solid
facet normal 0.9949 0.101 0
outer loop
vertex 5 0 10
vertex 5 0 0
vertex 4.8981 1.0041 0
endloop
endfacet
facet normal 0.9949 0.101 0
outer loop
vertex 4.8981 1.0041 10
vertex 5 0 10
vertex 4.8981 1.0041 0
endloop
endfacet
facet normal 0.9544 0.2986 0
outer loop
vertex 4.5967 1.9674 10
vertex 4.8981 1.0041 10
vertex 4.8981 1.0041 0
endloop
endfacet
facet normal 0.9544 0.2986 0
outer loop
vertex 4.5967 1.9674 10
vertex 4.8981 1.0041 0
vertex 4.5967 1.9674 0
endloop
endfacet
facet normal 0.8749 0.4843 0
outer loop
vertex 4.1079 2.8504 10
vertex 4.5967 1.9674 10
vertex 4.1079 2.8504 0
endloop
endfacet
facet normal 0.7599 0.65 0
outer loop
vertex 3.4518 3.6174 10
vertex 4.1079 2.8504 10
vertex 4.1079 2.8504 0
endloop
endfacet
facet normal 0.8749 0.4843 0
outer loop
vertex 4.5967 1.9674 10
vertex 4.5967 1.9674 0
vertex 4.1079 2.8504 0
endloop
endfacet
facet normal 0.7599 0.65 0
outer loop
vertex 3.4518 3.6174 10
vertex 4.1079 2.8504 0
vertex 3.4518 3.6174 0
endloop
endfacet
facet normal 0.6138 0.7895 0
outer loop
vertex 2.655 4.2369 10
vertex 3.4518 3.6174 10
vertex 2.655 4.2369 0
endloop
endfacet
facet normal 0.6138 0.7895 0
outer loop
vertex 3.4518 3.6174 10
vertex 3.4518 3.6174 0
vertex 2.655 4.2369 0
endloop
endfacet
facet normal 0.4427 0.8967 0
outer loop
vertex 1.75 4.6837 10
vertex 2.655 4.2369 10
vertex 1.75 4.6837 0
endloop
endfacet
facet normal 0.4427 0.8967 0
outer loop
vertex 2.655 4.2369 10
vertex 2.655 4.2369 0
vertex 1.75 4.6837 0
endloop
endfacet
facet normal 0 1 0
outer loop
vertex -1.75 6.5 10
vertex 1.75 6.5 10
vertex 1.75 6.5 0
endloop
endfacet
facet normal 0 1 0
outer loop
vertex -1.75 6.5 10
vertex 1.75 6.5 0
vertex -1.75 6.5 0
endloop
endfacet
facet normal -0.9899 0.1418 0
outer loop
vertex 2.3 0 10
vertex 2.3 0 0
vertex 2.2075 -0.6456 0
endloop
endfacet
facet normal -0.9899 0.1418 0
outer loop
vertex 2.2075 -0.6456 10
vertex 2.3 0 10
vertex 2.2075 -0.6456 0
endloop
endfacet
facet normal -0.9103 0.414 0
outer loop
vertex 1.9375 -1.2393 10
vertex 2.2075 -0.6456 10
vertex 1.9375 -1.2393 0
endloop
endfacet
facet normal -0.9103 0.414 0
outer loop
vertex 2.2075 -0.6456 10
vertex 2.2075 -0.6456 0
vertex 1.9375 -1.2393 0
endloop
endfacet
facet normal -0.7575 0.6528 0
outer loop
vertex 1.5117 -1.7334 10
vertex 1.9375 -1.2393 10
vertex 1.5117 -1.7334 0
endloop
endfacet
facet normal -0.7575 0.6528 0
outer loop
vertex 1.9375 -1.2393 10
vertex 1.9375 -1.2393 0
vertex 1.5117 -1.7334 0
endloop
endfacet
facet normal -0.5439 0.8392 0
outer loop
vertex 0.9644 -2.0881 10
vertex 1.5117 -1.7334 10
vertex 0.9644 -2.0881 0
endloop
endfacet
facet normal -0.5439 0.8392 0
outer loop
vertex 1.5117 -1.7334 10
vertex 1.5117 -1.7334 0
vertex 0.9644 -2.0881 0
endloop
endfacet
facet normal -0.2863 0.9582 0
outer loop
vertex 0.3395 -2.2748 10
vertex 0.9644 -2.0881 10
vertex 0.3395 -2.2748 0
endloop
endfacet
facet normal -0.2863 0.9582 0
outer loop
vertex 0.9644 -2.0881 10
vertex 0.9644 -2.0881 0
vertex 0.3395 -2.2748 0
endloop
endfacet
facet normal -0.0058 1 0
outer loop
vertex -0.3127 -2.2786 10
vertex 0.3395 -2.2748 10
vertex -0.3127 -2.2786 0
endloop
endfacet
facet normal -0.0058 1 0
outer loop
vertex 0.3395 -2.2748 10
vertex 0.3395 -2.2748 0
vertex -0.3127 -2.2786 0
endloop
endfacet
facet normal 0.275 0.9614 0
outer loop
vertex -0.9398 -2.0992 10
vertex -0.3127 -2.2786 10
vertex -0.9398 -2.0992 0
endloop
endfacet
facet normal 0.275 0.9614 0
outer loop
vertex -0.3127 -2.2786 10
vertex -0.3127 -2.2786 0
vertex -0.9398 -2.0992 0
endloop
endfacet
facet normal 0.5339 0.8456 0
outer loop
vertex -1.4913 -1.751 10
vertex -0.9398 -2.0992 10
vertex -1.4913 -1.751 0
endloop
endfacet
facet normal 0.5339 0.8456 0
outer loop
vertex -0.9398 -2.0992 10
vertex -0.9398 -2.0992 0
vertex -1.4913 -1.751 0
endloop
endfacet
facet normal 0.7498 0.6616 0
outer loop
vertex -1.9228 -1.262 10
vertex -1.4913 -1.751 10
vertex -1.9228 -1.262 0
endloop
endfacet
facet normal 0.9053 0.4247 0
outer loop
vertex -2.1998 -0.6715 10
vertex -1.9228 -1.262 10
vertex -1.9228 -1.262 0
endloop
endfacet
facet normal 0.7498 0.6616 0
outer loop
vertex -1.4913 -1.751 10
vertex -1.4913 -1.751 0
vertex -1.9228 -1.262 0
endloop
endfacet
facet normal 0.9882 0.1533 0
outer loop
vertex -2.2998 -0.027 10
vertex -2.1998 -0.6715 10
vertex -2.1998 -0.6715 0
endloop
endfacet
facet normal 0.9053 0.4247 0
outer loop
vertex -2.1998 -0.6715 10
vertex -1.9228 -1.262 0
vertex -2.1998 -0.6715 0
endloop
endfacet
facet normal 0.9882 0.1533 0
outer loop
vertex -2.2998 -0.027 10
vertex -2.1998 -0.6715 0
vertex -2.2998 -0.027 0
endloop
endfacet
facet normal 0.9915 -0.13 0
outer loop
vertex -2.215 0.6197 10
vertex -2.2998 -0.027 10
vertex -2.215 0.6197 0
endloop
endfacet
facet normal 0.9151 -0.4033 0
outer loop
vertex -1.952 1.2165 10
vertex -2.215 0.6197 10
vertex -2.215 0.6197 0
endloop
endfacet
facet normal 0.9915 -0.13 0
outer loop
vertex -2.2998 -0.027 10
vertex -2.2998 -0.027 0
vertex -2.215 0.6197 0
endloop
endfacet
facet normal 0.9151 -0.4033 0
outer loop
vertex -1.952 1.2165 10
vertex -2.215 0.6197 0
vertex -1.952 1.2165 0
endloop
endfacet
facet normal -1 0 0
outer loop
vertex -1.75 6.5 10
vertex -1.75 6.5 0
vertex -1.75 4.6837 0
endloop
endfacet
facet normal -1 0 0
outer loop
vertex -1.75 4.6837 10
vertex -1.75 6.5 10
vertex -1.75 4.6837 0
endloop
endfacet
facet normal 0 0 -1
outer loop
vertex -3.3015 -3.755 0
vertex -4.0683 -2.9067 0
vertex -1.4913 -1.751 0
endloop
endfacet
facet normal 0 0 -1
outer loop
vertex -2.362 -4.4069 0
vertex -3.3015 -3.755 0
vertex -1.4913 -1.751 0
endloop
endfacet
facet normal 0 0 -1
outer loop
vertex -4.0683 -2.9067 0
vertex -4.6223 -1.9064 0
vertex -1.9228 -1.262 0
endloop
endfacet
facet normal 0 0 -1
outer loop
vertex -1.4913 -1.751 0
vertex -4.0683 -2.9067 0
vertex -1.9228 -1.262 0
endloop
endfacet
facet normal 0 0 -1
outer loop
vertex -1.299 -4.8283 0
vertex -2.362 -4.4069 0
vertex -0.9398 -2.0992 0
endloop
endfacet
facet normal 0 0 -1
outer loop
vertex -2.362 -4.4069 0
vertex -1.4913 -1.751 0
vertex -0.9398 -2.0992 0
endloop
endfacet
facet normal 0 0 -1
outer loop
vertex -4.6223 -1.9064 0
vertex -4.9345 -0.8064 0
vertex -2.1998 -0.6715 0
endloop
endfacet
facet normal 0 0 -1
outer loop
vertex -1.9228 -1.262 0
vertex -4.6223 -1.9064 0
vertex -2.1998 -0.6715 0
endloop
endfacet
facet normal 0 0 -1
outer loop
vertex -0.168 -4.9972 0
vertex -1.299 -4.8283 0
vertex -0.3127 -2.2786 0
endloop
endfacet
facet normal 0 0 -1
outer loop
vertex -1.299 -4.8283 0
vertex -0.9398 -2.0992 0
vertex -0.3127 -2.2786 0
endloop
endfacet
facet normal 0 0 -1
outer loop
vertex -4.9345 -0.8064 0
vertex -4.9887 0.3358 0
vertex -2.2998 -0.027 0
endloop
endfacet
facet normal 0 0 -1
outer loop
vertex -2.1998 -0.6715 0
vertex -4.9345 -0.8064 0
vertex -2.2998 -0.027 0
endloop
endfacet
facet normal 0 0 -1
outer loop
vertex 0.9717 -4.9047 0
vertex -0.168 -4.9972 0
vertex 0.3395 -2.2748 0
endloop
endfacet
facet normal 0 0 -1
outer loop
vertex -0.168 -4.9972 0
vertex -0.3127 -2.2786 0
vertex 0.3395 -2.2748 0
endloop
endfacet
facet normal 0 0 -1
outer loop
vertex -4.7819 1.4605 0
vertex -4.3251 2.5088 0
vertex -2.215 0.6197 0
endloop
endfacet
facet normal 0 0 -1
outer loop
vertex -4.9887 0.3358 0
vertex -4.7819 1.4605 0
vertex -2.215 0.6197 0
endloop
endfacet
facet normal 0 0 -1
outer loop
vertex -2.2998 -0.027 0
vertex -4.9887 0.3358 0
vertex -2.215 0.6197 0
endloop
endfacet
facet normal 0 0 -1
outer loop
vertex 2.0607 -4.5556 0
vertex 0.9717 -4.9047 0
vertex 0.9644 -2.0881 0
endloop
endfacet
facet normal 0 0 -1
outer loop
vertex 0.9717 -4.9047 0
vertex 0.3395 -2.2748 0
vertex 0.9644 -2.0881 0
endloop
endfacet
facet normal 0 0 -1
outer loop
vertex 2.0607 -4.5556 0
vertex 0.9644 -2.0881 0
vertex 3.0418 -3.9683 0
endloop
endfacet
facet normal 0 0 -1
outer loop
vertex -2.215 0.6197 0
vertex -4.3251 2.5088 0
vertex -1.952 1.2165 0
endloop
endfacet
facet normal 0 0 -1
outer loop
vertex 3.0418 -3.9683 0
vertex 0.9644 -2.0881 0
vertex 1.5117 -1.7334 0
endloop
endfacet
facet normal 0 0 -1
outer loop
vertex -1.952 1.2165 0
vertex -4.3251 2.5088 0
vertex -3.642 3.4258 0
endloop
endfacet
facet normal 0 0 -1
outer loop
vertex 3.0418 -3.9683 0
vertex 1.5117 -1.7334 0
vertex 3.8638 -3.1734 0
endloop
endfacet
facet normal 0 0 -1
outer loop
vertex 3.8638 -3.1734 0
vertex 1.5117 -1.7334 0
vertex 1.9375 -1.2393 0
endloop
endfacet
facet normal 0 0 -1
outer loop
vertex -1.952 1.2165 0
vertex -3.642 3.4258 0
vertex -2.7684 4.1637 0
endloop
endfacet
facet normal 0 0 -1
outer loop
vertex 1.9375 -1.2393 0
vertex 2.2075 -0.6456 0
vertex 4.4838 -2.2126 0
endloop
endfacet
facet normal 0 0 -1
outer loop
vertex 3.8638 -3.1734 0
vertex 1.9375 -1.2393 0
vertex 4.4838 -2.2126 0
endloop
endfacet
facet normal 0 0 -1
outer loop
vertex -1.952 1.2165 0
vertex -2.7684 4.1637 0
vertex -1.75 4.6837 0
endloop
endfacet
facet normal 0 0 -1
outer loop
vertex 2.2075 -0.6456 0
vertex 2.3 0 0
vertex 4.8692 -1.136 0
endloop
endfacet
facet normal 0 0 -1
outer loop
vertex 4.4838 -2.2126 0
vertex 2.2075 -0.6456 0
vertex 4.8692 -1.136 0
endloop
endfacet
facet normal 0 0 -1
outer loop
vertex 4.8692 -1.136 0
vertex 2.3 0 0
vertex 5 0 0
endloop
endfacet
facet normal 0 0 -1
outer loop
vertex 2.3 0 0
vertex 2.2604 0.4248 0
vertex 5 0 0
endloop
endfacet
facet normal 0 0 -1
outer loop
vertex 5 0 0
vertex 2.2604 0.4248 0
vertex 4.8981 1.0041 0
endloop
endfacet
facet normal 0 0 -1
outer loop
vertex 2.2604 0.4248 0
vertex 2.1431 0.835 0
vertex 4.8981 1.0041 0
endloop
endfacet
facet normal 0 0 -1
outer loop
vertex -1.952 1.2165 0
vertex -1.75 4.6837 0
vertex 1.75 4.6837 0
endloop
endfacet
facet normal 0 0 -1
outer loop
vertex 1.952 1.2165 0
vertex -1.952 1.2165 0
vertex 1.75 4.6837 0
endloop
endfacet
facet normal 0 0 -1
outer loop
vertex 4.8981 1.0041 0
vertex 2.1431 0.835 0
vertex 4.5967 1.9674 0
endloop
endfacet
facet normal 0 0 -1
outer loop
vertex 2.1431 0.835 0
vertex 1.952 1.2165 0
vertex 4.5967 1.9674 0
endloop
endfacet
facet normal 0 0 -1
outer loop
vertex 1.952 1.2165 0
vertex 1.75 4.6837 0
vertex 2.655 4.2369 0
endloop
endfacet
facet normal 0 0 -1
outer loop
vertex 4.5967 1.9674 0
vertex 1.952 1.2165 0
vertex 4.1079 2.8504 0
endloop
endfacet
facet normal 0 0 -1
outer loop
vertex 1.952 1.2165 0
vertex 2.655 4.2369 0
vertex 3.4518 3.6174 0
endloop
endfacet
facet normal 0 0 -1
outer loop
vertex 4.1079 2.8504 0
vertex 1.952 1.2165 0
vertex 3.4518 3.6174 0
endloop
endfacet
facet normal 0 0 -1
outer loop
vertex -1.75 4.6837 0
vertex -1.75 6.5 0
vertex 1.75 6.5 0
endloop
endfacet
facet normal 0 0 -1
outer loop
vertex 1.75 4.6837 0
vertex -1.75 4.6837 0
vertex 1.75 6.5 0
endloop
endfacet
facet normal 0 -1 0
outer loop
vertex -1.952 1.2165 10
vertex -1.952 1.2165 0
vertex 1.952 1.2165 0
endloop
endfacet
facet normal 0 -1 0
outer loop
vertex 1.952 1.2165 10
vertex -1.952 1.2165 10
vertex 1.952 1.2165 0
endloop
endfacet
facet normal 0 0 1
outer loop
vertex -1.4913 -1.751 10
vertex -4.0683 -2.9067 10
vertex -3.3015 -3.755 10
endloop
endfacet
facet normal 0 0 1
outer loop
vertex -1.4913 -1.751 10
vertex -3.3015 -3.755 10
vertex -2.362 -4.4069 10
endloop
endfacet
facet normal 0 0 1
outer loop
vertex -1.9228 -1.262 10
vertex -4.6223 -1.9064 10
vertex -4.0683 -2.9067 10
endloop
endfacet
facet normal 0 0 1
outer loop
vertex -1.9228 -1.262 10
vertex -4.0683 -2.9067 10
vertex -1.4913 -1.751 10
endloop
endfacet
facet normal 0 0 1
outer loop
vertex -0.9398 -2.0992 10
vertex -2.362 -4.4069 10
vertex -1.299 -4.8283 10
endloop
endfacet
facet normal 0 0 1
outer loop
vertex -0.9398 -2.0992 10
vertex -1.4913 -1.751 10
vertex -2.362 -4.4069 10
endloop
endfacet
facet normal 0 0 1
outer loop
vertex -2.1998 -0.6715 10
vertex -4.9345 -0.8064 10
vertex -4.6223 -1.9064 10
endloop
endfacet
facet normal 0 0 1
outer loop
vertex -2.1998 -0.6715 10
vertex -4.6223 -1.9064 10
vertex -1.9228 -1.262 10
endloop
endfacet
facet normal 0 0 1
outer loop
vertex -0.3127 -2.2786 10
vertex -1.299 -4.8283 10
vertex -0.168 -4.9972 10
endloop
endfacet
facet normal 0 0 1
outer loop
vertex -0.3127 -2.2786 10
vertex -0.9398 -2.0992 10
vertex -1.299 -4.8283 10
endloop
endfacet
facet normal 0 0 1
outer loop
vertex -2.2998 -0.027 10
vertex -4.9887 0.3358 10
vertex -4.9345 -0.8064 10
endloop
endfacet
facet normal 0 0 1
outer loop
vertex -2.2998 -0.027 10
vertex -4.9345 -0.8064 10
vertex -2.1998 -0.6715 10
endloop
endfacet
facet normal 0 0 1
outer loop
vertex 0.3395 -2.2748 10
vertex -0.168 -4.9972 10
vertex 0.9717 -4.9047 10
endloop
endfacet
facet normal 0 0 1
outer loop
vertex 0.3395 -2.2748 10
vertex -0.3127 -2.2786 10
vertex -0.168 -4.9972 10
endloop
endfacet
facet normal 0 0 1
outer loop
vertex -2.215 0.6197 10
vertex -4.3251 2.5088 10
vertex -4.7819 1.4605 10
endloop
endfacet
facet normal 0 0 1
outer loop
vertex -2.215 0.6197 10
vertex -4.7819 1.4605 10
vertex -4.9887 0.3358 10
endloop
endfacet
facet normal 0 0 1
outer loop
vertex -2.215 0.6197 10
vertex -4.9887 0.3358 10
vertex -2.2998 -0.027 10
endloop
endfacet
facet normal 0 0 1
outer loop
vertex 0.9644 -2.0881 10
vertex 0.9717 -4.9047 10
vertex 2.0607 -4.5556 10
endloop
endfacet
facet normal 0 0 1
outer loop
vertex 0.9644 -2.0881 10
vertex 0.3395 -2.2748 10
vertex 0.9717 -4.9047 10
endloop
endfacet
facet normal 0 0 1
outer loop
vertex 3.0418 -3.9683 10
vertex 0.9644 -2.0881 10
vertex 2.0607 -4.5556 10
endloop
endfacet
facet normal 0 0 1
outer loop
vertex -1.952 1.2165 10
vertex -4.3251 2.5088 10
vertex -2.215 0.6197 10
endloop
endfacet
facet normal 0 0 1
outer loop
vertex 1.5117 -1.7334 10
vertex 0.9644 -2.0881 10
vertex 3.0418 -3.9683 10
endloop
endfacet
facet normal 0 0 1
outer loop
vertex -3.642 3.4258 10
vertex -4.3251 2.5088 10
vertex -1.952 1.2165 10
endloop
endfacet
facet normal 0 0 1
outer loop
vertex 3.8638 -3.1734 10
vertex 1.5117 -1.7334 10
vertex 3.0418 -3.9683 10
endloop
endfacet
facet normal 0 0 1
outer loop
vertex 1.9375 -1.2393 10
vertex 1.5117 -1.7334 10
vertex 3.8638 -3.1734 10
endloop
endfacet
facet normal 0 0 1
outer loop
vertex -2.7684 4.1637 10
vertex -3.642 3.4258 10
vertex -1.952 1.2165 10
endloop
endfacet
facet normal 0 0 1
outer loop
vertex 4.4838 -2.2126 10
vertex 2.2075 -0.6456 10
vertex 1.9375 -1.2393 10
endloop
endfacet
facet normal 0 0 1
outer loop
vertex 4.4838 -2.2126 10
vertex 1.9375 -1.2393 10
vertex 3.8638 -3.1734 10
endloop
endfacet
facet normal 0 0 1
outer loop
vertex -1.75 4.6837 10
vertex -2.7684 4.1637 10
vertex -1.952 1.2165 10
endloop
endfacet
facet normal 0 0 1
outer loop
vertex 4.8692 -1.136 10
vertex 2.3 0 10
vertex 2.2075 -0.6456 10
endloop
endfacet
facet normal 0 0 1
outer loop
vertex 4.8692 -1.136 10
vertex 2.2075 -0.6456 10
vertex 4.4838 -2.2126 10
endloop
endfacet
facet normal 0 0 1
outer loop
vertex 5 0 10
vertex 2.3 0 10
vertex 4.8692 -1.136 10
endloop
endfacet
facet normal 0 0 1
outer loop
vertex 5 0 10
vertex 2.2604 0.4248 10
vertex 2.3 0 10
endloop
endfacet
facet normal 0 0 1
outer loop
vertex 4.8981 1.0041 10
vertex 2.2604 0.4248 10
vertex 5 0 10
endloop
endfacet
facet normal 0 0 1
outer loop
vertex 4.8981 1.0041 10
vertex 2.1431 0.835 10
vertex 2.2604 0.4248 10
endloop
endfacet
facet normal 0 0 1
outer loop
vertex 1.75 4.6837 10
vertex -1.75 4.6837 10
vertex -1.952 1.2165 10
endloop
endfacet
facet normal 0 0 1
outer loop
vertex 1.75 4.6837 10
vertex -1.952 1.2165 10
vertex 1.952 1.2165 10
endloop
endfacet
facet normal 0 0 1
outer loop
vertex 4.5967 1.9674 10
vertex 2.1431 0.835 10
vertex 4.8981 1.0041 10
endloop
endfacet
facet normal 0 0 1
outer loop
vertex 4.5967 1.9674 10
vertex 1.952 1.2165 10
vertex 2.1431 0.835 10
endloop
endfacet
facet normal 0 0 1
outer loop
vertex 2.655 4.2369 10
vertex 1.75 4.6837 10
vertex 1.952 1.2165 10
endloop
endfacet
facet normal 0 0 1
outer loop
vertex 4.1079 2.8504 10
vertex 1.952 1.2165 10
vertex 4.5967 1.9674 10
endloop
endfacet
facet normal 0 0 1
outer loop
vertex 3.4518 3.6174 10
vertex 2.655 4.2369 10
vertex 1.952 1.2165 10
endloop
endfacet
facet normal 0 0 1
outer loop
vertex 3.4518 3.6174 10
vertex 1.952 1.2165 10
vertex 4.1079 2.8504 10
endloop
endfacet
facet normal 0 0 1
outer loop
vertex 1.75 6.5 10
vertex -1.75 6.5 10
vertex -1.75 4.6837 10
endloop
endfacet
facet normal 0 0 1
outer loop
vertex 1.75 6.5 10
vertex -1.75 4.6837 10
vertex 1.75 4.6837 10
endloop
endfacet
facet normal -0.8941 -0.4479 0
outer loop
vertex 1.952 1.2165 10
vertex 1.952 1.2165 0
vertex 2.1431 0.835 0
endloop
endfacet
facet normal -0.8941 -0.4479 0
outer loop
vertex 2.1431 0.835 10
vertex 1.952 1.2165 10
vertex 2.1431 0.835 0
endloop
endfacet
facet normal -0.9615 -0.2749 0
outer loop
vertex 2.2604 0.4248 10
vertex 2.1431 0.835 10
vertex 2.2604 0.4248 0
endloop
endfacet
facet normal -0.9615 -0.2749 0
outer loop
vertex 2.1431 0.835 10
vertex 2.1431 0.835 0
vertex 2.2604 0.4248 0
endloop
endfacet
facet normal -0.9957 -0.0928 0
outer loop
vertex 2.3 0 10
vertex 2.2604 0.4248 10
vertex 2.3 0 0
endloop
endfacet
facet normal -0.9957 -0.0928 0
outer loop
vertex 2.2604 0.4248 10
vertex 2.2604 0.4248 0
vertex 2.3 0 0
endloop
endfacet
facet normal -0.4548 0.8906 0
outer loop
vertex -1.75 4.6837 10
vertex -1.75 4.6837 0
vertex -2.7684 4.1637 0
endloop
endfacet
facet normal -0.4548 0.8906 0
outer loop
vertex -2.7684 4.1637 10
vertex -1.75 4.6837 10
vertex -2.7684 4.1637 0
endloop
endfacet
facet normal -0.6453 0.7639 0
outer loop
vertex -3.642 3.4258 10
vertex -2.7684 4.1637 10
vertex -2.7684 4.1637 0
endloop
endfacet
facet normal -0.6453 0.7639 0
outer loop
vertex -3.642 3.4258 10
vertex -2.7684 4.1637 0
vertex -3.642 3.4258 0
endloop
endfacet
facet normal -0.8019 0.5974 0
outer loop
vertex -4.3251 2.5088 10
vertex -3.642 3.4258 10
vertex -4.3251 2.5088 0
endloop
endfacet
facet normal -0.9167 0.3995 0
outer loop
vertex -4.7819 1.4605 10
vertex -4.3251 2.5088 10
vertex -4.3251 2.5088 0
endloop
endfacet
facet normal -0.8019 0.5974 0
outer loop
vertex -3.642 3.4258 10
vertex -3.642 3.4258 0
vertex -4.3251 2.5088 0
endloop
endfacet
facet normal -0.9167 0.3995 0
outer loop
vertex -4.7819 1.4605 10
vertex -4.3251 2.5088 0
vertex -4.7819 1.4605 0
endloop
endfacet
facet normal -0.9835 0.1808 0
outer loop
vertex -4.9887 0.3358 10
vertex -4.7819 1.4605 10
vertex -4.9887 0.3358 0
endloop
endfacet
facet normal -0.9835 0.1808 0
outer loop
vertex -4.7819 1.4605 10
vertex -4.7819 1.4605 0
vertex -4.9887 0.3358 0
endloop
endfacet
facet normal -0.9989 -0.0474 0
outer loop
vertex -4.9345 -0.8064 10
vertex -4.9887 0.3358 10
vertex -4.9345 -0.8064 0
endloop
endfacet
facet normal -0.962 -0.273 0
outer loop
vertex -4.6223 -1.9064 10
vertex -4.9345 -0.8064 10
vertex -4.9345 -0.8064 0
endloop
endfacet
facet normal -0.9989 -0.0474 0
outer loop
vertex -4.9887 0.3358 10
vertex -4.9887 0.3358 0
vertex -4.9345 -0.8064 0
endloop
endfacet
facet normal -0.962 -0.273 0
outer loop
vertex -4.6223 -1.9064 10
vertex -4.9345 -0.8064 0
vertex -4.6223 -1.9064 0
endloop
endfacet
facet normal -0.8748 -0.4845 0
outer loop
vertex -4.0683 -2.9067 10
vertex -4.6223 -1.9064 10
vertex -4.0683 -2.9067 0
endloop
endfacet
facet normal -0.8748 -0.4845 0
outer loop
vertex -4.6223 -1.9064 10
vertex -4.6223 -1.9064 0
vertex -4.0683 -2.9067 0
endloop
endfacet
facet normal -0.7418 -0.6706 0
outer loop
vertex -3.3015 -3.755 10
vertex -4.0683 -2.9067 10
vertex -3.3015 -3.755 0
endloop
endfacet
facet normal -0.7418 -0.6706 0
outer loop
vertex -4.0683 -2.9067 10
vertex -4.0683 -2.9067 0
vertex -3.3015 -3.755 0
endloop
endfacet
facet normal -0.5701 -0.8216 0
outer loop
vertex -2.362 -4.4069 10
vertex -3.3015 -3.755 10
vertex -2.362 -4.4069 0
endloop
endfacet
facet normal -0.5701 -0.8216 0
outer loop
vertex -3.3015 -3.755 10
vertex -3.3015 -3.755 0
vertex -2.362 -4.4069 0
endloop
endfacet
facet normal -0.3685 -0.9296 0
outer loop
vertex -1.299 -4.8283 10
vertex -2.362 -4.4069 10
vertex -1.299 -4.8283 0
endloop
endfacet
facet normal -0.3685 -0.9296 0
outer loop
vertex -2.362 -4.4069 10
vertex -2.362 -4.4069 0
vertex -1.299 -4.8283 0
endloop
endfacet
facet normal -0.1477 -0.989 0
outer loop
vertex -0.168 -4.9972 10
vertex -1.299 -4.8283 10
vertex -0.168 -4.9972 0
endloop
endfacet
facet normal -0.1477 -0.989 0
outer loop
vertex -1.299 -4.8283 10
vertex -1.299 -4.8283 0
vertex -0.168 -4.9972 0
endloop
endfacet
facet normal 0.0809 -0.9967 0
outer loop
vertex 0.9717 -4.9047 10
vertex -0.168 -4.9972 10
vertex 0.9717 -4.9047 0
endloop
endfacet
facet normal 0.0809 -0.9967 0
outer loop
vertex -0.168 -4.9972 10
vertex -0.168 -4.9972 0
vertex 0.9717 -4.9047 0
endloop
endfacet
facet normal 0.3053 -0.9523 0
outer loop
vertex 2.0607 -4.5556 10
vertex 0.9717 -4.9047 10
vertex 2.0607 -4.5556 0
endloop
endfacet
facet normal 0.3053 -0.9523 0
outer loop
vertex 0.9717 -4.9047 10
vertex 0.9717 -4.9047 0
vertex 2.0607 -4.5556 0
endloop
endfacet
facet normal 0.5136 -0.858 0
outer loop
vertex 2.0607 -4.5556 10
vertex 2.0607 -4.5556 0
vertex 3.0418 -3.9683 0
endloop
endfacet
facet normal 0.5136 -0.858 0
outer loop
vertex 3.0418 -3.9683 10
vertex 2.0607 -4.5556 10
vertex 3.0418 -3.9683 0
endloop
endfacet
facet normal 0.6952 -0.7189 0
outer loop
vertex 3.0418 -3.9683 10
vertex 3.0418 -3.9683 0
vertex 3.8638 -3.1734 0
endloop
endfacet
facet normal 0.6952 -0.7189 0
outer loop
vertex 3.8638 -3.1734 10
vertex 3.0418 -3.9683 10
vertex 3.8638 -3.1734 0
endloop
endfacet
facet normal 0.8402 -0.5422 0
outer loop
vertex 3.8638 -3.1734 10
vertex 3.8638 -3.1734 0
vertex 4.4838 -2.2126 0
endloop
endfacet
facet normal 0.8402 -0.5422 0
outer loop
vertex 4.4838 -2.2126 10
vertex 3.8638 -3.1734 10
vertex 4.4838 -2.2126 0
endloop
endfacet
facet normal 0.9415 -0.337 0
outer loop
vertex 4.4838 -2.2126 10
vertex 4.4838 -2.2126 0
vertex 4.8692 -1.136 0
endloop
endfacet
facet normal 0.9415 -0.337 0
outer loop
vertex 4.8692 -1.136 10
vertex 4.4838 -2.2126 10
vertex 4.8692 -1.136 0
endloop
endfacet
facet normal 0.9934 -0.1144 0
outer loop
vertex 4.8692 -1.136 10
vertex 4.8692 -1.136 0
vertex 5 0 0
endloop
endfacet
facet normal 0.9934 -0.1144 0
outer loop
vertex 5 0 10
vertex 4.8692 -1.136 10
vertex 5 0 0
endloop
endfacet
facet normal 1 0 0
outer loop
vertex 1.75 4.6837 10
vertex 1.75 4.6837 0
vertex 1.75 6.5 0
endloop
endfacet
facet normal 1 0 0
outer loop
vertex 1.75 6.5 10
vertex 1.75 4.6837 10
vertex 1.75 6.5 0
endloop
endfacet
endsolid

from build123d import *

# Parameters (mm, degrees)
BOSS_EXTRUDE1_DEPTH = 10


with BuildPart() as part:
    # Sketch2 → Boss-Extrude1 (new body)
    with BuildSketch(Plane.XY):
        with BuildLine():
            ThreePointArc((0, 5), (0.889173073, 4.920301947), (1.75, 4.683748499))
            Line((1.75, 4.683748499), (1.75, 6.5))
            Line((1.75, 6.5), (0, 6.5))
            Line((0, 6.5), (0, 5))
        make_face()
        with BuildLine():
            ThreePointArc((-1.75, 4.683748499), (-0.889173073, 4.920301947), (0, 5))
            Line((0, 5), (0, 6.5))
            Line((0, 6.5), (-1.75, 6.5))
            Line((-1.75, 6.5), (-1.75, 4.683748499))
        make_face()
        with BuildLine():
            ThreePointArc((1.75, 1.492481156), (1.856113866, 1.358249358), (1.95195478, 1.216500118))
            ThreePointArc((1.95195478, 1.216500118), (2.211277458, 0.632654726), (2.3, 0))
            ThreePointArc((2.3, 0), (-0.632654726, -2.211277458), (-1.95195478, 1.216500118))
            ThreePointArc((-1.95195478, 1.216500118), (-1.856113866, 1.358249358), (-1.75, 1.492481156))
            Line((-1.75, 1.492481156), (-1.75, 4.683748499))
            ThreePointArc((-1.75, 4.683748499), (-2.850438563, -4.107919181), (5, 0))
            ThreePointArc((5, 0), (4.107919181, 2.850438563), (1.75, 4.683748499))
            Line((1.75, 4.683748499), (1.75, 1.492481156))
        make_face()
        with BuildLine():
            ThreePointArc((-1.75, 1.492481156), (-0.963663152, 2.08838534), (0, 2.3))
            Line((0, 2.3), (0, 5))
            ThreePointArc((0, 5), (-0.889173073, 4.920301947), (-1.75, 4.683748499))
            Line((-1.75, 4.683748499), (-1.75, 1.492481156))
        make_face()
        with BuildLine():
            ThreePointArc((0, 2.3), (0.963663152, 2.08838534), (1.75, 1.492481156))
            Line((1.75, 1.492481156), (1.75, 4.683748499))
            ThreePointArc((1.75, 4.683748499), (0.889173073, 4.920301947), (0, 5))
            Line((0, 5), (0, 2.3))
        make_face()
        with BuildLine():
            Line((0, 1.216500118), (1.75, 1.216500118))
            Line((1.75, 1.216500118), (1.75, 1.492481156))
            ThreePointArc((1.75, 1.492481156), (0.963663152, 2.08838534), (0, 2.3))
            Line((0, 2.3), (0, 1.216500118))
        make_face()
        with BuildLine():
            Line((-1.75, 1.216500118), (0, 1.216500118))
            Line((0, 1.216500118), (0, 2.3))
            ThreePointArc((0, 2.3), (-0.963663152, 2.08838534), (-1.75, 1.492481156))
            Line((-1.75, 1.492481156), (-1.75, 1.216500118))
        make_face()
        with BuildLine():
            ThreePointArc((-1.75, 1.492481156), (-1.856113866, 1.358249358), (-1.95195478, 1.216500118))
            Line((-1.95195478, 1.216500118), (-1.75, 1.216500118))
            Line((-1.75, 1.216500118), (-1.75, 1.492481156))
        make_face()
        with BuildLine():
            Line((1.75, 1.216500118), (1.95195478, 1.216500118))
            ThreePointArc((1.95195478, 1.216500118), (1.856113866, 1.358249358), (1.75, 1.492481156))
            Line((1.75, 1.492481156), (1.75, 1.216500118))
        make_face()
    extrude(amount=BOSS_EXTRUDE1_DEPTH)


solid = part.part
